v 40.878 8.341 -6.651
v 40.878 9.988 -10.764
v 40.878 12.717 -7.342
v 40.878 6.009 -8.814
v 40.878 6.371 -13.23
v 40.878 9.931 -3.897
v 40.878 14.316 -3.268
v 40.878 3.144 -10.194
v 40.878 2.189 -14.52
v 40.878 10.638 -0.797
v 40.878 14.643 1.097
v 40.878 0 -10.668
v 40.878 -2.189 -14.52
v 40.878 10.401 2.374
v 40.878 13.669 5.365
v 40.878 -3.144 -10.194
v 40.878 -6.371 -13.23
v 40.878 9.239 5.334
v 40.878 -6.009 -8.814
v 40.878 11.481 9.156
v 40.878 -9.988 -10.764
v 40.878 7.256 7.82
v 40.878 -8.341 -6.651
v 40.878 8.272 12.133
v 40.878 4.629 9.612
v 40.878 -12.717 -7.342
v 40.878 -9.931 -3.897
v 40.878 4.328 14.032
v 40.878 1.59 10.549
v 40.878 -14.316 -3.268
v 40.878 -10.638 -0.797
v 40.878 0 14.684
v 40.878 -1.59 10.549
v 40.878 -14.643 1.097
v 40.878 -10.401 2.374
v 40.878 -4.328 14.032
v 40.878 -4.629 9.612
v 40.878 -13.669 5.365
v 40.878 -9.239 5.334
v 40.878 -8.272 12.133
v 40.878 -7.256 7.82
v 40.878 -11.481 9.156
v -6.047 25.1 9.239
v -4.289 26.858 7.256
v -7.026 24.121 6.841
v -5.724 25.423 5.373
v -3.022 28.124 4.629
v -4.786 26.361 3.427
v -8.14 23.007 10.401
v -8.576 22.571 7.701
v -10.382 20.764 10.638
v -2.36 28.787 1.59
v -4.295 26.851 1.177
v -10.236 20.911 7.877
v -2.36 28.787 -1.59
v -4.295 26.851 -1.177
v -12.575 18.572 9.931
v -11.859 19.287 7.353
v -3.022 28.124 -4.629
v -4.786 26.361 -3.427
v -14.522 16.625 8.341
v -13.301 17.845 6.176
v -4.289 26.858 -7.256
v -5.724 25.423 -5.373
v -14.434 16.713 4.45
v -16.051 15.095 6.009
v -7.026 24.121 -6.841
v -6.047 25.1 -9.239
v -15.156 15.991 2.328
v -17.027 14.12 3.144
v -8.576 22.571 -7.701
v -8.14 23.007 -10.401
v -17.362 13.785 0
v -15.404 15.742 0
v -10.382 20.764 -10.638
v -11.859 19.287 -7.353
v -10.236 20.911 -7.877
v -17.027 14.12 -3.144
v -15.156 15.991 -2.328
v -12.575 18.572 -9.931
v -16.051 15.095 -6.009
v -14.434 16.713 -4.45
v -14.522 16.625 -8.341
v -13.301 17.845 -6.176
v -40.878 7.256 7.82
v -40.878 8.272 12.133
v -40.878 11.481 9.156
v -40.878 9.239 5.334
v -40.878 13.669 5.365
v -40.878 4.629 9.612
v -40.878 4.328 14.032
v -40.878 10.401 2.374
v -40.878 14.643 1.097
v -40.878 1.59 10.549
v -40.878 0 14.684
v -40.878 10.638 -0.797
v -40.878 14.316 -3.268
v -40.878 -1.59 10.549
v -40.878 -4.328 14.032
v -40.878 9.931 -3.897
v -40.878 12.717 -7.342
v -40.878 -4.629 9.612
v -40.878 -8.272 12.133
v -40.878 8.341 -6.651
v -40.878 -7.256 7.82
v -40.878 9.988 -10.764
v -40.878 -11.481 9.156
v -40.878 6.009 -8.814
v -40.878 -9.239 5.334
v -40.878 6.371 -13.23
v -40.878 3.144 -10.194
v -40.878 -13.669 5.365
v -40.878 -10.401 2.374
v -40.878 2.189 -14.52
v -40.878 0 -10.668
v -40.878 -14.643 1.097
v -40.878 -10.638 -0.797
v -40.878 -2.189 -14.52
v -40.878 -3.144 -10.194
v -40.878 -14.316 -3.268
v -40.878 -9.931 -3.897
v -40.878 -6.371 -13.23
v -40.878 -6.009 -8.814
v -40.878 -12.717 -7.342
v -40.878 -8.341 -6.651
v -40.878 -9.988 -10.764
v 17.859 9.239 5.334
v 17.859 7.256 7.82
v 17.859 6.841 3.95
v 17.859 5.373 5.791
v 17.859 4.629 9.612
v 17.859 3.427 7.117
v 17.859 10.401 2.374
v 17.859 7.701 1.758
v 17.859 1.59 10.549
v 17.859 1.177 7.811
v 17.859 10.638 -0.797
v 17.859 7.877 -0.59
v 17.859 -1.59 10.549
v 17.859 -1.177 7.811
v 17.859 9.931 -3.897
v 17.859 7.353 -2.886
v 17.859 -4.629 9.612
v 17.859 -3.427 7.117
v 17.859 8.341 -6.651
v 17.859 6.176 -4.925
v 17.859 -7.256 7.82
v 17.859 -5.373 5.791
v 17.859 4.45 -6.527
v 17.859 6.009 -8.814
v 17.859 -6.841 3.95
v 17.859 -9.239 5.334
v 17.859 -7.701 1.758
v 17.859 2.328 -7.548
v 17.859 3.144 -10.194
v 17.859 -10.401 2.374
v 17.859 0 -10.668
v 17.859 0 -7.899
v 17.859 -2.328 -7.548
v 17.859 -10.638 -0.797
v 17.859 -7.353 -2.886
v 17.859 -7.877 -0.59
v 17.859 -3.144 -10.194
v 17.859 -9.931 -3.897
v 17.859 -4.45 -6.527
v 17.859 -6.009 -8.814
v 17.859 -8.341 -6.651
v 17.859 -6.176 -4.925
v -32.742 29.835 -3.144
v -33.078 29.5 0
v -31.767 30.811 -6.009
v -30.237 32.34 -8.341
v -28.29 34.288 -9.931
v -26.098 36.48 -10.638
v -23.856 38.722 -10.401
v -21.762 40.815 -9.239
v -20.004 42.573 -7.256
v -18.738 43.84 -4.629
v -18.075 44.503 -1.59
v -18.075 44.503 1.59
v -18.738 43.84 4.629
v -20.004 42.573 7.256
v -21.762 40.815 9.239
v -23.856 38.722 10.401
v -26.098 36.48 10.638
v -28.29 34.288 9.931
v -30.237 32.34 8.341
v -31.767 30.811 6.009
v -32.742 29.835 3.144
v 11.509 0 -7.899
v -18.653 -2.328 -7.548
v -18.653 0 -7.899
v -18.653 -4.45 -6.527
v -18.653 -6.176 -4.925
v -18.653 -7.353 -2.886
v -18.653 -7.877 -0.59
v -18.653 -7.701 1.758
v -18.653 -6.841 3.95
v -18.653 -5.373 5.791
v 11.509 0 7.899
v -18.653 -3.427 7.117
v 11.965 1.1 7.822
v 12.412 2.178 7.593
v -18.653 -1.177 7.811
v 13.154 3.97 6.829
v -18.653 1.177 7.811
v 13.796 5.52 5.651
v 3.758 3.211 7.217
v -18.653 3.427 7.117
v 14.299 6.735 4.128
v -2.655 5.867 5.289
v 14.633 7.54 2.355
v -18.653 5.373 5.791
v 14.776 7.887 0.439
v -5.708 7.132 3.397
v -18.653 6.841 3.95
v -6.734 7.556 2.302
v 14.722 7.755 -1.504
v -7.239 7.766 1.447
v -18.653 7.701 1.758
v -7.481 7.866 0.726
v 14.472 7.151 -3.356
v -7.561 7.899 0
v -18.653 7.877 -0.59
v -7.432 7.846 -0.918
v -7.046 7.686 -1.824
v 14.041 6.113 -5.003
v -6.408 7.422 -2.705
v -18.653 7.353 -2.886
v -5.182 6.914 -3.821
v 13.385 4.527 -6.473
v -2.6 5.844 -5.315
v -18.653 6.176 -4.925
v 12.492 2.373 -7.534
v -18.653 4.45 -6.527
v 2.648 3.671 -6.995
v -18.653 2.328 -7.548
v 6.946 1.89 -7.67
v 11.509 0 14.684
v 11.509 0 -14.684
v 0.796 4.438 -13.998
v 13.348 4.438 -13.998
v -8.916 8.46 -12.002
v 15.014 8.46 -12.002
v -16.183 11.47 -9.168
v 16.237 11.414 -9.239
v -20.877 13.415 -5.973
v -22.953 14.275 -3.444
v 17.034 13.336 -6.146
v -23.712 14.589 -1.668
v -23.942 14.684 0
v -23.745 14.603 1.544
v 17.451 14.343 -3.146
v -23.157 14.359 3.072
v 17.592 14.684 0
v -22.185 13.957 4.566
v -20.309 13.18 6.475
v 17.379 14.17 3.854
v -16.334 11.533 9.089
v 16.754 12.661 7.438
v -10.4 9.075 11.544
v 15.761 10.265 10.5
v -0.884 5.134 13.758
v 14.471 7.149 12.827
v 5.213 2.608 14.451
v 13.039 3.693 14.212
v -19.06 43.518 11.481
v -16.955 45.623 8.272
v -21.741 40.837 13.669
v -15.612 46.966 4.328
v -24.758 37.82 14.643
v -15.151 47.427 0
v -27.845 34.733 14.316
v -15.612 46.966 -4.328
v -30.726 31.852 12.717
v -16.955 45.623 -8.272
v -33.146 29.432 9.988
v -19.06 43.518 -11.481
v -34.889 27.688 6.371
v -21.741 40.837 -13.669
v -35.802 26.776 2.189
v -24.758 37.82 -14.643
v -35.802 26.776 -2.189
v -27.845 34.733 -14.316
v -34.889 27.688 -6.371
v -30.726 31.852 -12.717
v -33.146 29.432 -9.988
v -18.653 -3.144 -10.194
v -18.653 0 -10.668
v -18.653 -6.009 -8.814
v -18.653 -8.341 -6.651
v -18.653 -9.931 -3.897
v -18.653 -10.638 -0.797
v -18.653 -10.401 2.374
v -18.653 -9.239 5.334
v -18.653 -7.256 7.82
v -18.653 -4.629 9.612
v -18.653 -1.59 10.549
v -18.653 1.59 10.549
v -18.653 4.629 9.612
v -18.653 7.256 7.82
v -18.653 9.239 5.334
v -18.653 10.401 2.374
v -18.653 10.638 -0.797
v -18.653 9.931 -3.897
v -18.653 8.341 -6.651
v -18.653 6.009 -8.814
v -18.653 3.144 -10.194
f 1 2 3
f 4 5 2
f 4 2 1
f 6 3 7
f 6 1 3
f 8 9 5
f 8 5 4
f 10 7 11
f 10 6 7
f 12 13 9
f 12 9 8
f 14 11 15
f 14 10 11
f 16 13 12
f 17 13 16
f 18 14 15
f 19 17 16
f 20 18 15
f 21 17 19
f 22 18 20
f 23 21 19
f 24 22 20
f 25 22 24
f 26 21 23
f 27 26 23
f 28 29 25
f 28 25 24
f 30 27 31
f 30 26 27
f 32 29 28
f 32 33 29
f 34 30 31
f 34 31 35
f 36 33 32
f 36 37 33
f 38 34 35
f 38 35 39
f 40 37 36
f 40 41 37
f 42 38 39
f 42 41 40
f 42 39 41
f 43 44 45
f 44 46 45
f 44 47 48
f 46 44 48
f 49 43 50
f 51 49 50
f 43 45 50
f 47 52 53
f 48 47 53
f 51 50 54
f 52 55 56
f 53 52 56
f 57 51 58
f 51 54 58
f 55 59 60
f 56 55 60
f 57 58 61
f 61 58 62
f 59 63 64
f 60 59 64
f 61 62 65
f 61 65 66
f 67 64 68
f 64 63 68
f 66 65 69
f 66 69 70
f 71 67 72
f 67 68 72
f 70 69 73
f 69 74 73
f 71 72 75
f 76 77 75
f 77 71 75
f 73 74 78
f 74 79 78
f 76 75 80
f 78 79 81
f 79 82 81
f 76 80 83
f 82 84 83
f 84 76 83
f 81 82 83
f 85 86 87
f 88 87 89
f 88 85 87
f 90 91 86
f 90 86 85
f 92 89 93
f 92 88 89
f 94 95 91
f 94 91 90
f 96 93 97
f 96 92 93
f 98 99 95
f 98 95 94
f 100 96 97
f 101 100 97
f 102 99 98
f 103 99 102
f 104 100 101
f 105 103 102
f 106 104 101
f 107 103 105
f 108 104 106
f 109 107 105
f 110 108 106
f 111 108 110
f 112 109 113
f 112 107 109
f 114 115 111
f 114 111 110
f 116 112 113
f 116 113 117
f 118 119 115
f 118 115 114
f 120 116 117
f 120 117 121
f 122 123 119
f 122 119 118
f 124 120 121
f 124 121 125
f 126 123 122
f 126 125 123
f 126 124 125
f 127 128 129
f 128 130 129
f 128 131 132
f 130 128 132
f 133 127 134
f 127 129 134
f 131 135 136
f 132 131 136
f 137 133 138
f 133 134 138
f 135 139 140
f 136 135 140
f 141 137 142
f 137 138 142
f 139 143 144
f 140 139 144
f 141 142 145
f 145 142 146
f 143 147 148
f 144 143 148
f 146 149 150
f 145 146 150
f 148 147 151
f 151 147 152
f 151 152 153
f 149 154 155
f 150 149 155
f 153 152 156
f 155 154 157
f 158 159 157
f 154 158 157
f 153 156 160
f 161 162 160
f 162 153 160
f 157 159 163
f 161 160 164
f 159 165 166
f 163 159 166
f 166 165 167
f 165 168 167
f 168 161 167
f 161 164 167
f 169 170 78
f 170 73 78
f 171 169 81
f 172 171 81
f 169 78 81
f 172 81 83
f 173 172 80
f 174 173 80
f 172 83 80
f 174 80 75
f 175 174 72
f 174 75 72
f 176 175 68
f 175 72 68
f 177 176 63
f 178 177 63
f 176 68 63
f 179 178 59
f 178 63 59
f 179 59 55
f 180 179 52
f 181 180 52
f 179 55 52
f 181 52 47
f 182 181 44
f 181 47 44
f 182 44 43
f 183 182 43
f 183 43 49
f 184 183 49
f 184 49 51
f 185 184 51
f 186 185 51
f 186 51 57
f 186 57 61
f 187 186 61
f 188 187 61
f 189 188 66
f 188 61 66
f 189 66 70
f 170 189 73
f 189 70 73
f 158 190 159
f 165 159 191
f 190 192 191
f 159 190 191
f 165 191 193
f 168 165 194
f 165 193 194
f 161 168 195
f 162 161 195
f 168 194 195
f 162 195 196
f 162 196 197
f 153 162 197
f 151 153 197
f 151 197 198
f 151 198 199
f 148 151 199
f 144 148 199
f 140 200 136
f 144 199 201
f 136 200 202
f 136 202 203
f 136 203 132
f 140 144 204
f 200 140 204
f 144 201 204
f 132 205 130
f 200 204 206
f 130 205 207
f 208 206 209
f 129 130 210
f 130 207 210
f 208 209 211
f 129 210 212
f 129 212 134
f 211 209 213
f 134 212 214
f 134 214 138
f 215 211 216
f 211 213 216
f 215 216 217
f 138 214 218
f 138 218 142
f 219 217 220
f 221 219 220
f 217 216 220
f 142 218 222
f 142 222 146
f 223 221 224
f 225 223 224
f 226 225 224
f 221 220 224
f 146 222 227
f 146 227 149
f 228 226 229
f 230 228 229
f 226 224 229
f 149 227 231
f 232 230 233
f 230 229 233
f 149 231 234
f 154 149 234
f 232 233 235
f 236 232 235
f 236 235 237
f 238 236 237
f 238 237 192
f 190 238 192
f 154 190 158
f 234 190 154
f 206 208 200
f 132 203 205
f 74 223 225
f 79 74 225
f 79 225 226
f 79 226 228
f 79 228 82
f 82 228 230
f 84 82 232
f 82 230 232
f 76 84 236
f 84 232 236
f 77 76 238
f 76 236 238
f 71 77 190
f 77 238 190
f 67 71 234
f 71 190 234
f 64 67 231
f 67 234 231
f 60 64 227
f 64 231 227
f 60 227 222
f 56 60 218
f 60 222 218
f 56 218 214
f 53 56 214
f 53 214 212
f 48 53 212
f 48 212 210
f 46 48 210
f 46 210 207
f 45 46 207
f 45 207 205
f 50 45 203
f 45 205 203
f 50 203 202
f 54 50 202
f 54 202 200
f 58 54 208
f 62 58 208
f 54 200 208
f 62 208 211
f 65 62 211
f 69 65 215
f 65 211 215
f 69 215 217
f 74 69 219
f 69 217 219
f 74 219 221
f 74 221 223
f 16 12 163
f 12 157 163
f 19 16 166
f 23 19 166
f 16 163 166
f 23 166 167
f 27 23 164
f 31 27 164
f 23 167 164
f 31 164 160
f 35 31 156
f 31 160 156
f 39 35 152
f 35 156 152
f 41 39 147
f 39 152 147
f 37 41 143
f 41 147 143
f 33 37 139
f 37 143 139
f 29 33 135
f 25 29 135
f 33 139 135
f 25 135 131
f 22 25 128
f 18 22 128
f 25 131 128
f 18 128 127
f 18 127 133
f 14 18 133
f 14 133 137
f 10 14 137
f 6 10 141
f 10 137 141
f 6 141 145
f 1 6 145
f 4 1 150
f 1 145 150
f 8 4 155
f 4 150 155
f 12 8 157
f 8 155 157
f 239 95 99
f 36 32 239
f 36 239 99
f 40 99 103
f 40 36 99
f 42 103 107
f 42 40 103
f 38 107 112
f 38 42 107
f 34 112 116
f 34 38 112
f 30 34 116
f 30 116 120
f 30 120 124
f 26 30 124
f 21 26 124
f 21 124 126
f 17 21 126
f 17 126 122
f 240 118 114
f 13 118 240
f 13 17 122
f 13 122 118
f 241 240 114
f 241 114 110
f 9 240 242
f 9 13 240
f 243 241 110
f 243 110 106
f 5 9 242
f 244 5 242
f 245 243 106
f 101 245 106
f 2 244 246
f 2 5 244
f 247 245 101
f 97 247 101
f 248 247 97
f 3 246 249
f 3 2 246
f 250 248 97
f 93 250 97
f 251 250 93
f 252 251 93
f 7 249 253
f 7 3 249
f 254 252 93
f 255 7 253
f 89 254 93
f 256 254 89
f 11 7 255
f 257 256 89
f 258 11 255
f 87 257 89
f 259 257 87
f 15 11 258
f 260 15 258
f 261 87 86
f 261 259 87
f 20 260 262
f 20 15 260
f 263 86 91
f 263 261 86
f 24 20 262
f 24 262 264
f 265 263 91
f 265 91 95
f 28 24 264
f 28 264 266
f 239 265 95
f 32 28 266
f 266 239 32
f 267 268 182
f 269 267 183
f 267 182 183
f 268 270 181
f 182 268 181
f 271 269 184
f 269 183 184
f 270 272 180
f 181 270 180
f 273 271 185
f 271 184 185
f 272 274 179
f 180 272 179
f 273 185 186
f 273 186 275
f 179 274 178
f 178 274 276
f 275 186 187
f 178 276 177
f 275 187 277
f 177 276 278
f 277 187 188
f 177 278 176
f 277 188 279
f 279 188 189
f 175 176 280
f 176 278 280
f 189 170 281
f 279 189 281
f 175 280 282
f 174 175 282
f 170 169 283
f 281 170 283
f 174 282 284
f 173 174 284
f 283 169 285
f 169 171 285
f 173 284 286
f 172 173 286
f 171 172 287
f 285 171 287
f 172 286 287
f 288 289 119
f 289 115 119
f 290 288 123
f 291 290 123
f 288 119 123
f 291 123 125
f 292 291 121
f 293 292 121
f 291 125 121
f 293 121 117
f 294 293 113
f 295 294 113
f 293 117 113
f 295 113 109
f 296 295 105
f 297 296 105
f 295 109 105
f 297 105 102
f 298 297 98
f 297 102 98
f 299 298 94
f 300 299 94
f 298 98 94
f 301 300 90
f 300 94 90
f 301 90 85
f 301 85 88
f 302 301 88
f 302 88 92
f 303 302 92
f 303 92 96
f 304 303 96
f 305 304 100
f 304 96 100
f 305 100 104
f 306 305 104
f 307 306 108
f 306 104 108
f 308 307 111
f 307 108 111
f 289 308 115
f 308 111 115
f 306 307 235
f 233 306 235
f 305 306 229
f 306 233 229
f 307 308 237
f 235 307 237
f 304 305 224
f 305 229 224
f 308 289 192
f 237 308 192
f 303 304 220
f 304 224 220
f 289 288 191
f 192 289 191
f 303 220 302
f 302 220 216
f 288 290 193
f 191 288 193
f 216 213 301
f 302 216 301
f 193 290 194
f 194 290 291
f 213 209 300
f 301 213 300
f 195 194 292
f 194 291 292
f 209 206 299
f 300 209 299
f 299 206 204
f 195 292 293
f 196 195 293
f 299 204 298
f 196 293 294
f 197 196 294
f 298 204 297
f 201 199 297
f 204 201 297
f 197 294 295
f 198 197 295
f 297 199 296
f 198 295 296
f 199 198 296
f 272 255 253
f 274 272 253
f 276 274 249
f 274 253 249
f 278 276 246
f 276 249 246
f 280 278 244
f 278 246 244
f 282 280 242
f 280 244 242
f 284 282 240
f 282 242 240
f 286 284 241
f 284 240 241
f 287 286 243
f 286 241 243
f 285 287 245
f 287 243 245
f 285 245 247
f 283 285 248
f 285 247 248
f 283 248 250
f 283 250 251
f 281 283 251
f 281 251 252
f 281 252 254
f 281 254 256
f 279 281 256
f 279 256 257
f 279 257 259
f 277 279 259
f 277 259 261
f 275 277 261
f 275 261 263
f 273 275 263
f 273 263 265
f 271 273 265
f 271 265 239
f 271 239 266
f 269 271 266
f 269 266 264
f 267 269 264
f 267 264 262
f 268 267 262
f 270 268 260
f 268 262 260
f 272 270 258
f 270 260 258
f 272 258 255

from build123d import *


with BuildPart() as part:
    # Sketch1 → Revolve1 (revolve)
    with BuildSketch(Plane.XY):
        Polygon((-40.878125000000004, 14.684375), (40.87812500000002, 14.68437500000001), (40.878125000000026, -5.3e-15), (-40.87812500000002, -1.531e-14), align=None)
    revolve(axis=Axis((0, 0, 0), (1, 0, 0)))

    # Sketch2 → Revolve2 (revolve)
    with BuildSketch(Plane.XY):
        Polygon((-35.91760263939639, 26.660135359424125), (1.125953860013809, -10.383421139986174), (11.509375000000016, 0), (-25.53418149941018, 37.043556499410315), align=None)
    revolve(axis=Axis((-22.918474439856404, 34.427849439856544, 0), (-0.7071067811865464, 0.7071067811865488, 0)))

    # Sketch3 → Cut-Revolve1 (revolve, cut)
    with BuildSketch(Plane.XY):
        Polygon((-25.534181499651336, 37.043556499169185), (-33.0775966413494, 29.500141357471097), (-17.362148429478385, 13.784693145600082), (-15.40445259508532, 15.742388979993137), (5.92365569245394, -5.585719307546082), (11.509375000000016, 0), align=None)
    revolve(axis=Axis((-25.534181499651336, 37.043556499169185, 0), (0.707106781186548, -0.707106781186547, 0)), mode=Mode.SUBTRACT)

    # Sketch4 → Cut-Revolve2 (revolve, cut)
    with BuildSketch(Plane.XY):
        Polygon((40.87812500000001, 10.667999999999994), (17.85937500000001, 10.667999999999994), (17.85937500000001, 7.899399999999997), (-18.653124999999985, 7.89939999999999), (-18.653124999999985, 10.667999999999987), (-40.87812500000002, 10.667999999999983), (-40.87812500000002, -1.531e-14), (40.878125000000026, -5.3e-15), align=None)
    revolve(axis=Axis((17.859375000000455, 0, 0), (-1, 0, 0)), mode=Mode.SUBTRACT)


solid = part.part
